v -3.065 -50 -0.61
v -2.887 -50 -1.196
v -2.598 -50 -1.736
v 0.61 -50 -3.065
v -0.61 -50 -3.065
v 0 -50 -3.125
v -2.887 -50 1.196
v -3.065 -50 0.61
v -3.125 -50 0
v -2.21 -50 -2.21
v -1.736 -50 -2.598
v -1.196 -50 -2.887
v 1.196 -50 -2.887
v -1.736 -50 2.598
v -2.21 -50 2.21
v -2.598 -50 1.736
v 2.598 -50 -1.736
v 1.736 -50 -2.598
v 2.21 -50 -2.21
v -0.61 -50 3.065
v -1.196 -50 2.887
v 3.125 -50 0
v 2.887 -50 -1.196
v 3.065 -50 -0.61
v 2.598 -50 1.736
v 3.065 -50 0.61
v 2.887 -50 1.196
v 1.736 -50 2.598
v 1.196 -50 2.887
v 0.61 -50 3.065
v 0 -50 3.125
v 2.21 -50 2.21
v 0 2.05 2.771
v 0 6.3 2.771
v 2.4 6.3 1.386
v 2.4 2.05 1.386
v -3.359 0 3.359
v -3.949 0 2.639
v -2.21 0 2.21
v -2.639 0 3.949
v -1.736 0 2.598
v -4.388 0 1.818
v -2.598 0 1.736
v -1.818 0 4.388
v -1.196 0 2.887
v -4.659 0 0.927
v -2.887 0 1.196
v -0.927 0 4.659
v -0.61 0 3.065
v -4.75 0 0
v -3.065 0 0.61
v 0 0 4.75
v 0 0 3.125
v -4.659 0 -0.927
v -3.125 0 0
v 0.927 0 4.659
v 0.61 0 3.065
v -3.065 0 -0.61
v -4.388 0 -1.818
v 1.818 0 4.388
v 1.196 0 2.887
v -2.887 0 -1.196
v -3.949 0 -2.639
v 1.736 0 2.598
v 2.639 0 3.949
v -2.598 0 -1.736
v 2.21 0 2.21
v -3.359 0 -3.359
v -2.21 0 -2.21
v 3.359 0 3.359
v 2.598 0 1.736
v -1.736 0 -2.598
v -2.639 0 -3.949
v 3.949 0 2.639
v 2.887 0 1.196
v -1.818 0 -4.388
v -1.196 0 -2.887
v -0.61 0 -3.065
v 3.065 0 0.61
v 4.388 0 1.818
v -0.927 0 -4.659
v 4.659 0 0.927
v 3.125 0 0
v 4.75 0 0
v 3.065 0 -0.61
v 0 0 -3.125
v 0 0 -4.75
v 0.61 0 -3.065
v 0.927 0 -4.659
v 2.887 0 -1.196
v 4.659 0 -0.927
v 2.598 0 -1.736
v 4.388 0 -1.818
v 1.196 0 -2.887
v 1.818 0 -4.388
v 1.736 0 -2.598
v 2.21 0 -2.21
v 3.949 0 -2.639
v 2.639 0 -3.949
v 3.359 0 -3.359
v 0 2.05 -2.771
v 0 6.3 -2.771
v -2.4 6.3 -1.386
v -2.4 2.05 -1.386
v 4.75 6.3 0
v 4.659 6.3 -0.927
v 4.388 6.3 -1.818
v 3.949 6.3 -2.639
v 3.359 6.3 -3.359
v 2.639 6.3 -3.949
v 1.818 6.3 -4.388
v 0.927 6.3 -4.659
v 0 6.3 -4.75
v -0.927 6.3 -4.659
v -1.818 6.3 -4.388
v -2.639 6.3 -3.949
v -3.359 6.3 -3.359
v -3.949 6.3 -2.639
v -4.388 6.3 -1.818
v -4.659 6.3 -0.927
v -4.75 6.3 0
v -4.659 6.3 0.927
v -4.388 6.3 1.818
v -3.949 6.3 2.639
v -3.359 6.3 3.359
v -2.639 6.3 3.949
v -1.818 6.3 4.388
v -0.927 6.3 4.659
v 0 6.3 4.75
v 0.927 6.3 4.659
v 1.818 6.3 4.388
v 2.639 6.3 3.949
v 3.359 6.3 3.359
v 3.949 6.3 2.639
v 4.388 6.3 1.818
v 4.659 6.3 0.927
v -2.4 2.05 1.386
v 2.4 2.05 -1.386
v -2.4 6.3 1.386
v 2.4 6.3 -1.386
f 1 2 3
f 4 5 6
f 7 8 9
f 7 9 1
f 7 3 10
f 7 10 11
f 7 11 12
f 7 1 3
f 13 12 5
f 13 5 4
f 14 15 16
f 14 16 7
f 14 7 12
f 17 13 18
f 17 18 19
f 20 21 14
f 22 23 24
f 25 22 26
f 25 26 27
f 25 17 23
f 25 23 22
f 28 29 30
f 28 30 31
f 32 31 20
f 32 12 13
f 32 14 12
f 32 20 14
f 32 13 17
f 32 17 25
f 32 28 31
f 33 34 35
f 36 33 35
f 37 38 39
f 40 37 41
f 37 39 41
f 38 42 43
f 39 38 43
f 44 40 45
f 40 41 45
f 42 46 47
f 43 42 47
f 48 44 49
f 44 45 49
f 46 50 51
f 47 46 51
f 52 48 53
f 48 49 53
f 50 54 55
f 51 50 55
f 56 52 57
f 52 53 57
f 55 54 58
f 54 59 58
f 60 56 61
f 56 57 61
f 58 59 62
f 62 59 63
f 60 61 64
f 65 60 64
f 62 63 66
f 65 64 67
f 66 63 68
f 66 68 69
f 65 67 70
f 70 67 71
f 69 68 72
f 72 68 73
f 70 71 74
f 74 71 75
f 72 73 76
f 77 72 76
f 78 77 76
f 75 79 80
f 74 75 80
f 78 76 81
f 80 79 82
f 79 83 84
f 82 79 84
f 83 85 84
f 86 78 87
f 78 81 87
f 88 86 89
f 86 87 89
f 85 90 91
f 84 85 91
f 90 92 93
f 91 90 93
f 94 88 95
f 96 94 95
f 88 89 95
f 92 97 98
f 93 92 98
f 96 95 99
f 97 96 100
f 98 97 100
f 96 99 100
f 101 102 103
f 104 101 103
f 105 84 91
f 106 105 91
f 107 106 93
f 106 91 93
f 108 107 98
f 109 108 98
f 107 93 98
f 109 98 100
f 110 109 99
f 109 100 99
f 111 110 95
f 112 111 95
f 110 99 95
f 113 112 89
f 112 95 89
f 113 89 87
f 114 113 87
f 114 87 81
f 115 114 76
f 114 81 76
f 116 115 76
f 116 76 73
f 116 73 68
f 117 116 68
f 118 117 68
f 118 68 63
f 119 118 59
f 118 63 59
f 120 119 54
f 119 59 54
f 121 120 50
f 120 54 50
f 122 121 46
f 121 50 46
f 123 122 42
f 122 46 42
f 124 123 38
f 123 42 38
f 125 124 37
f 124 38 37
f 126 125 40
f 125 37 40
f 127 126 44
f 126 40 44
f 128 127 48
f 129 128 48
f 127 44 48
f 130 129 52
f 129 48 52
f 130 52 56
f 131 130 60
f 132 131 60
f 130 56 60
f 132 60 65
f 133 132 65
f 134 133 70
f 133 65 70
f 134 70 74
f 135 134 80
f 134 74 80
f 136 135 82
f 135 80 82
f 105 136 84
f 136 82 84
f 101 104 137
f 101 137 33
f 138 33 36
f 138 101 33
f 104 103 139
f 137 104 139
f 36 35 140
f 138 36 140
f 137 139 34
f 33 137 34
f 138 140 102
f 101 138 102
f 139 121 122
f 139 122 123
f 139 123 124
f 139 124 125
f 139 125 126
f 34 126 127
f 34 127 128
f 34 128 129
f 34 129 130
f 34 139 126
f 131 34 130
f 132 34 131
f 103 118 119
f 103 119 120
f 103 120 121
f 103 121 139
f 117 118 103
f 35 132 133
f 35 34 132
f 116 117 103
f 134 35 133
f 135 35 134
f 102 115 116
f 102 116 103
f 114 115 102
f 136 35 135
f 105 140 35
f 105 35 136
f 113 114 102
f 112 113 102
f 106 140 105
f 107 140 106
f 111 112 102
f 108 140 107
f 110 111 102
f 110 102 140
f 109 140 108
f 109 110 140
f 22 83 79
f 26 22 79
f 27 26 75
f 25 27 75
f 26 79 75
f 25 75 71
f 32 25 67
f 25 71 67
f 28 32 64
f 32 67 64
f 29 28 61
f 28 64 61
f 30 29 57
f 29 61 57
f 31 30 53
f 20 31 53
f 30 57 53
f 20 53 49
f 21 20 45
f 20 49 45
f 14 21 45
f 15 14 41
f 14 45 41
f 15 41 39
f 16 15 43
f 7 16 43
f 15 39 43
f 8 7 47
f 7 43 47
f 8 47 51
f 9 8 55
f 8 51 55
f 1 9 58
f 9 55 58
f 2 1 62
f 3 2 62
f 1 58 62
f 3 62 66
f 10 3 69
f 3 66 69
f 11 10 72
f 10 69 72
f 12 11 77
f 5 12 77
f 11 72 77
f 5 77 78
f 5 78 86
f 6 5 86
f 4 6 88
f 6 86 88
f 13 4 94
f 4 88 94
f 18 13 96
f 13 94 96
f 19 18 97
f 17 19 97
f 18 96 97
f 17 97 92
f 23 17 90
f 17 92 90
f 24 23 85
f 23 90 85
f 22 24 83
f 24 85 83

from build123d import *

# Parameters (mm, degrees)
SKETCH2_R           = 4.75
BOSS_EXTRUDE1_DEPTH = 6.3
SKETCH3_R           = 3.125
BOSS_EXTRUDE2_DEPTH = 50
CUT_EXTRUDE1_DEPTH  = 4.25


with BuildPart() as part:
    # Sketch2 → Boss-Extrude1 (new body)
    with BuildSketch(Plane(origin=(0, 0, 0), x_dir=(1, 0, 0), z_dir=(0, 1, 0))):
        Circle(SKETCH2_R)
    extrude(amount=BOSS_EXTRUDE1_DEPTH)

    # Sketch3 → Boss-Extrude2 (add)
    with BuildSketch(Plane.XZ):
        Circle(SKETCH3_R)
    extrude(amount=BOSS_EXTRUDE2_DEPTH)

    # Sketch4 → Cut-Extrude1 (cut)
    with BuildSketch(Plane(origin=(0, 6.3, 0), x_dir=(1, 0, 0), z_dir=(0, 1, 0))):
        Polygon((-2.4, 1.385640646), (-2.4, -1.385640646), (0, -2.771281292), (2.4, -1.385640646), (2.4, 1.385640646), (0, 2.771281292), align=None)
    extrude(amount=-CUT_EXTRUDE1_DEPTH, mode=Mode.SUBTRACT)


solid = part.part
